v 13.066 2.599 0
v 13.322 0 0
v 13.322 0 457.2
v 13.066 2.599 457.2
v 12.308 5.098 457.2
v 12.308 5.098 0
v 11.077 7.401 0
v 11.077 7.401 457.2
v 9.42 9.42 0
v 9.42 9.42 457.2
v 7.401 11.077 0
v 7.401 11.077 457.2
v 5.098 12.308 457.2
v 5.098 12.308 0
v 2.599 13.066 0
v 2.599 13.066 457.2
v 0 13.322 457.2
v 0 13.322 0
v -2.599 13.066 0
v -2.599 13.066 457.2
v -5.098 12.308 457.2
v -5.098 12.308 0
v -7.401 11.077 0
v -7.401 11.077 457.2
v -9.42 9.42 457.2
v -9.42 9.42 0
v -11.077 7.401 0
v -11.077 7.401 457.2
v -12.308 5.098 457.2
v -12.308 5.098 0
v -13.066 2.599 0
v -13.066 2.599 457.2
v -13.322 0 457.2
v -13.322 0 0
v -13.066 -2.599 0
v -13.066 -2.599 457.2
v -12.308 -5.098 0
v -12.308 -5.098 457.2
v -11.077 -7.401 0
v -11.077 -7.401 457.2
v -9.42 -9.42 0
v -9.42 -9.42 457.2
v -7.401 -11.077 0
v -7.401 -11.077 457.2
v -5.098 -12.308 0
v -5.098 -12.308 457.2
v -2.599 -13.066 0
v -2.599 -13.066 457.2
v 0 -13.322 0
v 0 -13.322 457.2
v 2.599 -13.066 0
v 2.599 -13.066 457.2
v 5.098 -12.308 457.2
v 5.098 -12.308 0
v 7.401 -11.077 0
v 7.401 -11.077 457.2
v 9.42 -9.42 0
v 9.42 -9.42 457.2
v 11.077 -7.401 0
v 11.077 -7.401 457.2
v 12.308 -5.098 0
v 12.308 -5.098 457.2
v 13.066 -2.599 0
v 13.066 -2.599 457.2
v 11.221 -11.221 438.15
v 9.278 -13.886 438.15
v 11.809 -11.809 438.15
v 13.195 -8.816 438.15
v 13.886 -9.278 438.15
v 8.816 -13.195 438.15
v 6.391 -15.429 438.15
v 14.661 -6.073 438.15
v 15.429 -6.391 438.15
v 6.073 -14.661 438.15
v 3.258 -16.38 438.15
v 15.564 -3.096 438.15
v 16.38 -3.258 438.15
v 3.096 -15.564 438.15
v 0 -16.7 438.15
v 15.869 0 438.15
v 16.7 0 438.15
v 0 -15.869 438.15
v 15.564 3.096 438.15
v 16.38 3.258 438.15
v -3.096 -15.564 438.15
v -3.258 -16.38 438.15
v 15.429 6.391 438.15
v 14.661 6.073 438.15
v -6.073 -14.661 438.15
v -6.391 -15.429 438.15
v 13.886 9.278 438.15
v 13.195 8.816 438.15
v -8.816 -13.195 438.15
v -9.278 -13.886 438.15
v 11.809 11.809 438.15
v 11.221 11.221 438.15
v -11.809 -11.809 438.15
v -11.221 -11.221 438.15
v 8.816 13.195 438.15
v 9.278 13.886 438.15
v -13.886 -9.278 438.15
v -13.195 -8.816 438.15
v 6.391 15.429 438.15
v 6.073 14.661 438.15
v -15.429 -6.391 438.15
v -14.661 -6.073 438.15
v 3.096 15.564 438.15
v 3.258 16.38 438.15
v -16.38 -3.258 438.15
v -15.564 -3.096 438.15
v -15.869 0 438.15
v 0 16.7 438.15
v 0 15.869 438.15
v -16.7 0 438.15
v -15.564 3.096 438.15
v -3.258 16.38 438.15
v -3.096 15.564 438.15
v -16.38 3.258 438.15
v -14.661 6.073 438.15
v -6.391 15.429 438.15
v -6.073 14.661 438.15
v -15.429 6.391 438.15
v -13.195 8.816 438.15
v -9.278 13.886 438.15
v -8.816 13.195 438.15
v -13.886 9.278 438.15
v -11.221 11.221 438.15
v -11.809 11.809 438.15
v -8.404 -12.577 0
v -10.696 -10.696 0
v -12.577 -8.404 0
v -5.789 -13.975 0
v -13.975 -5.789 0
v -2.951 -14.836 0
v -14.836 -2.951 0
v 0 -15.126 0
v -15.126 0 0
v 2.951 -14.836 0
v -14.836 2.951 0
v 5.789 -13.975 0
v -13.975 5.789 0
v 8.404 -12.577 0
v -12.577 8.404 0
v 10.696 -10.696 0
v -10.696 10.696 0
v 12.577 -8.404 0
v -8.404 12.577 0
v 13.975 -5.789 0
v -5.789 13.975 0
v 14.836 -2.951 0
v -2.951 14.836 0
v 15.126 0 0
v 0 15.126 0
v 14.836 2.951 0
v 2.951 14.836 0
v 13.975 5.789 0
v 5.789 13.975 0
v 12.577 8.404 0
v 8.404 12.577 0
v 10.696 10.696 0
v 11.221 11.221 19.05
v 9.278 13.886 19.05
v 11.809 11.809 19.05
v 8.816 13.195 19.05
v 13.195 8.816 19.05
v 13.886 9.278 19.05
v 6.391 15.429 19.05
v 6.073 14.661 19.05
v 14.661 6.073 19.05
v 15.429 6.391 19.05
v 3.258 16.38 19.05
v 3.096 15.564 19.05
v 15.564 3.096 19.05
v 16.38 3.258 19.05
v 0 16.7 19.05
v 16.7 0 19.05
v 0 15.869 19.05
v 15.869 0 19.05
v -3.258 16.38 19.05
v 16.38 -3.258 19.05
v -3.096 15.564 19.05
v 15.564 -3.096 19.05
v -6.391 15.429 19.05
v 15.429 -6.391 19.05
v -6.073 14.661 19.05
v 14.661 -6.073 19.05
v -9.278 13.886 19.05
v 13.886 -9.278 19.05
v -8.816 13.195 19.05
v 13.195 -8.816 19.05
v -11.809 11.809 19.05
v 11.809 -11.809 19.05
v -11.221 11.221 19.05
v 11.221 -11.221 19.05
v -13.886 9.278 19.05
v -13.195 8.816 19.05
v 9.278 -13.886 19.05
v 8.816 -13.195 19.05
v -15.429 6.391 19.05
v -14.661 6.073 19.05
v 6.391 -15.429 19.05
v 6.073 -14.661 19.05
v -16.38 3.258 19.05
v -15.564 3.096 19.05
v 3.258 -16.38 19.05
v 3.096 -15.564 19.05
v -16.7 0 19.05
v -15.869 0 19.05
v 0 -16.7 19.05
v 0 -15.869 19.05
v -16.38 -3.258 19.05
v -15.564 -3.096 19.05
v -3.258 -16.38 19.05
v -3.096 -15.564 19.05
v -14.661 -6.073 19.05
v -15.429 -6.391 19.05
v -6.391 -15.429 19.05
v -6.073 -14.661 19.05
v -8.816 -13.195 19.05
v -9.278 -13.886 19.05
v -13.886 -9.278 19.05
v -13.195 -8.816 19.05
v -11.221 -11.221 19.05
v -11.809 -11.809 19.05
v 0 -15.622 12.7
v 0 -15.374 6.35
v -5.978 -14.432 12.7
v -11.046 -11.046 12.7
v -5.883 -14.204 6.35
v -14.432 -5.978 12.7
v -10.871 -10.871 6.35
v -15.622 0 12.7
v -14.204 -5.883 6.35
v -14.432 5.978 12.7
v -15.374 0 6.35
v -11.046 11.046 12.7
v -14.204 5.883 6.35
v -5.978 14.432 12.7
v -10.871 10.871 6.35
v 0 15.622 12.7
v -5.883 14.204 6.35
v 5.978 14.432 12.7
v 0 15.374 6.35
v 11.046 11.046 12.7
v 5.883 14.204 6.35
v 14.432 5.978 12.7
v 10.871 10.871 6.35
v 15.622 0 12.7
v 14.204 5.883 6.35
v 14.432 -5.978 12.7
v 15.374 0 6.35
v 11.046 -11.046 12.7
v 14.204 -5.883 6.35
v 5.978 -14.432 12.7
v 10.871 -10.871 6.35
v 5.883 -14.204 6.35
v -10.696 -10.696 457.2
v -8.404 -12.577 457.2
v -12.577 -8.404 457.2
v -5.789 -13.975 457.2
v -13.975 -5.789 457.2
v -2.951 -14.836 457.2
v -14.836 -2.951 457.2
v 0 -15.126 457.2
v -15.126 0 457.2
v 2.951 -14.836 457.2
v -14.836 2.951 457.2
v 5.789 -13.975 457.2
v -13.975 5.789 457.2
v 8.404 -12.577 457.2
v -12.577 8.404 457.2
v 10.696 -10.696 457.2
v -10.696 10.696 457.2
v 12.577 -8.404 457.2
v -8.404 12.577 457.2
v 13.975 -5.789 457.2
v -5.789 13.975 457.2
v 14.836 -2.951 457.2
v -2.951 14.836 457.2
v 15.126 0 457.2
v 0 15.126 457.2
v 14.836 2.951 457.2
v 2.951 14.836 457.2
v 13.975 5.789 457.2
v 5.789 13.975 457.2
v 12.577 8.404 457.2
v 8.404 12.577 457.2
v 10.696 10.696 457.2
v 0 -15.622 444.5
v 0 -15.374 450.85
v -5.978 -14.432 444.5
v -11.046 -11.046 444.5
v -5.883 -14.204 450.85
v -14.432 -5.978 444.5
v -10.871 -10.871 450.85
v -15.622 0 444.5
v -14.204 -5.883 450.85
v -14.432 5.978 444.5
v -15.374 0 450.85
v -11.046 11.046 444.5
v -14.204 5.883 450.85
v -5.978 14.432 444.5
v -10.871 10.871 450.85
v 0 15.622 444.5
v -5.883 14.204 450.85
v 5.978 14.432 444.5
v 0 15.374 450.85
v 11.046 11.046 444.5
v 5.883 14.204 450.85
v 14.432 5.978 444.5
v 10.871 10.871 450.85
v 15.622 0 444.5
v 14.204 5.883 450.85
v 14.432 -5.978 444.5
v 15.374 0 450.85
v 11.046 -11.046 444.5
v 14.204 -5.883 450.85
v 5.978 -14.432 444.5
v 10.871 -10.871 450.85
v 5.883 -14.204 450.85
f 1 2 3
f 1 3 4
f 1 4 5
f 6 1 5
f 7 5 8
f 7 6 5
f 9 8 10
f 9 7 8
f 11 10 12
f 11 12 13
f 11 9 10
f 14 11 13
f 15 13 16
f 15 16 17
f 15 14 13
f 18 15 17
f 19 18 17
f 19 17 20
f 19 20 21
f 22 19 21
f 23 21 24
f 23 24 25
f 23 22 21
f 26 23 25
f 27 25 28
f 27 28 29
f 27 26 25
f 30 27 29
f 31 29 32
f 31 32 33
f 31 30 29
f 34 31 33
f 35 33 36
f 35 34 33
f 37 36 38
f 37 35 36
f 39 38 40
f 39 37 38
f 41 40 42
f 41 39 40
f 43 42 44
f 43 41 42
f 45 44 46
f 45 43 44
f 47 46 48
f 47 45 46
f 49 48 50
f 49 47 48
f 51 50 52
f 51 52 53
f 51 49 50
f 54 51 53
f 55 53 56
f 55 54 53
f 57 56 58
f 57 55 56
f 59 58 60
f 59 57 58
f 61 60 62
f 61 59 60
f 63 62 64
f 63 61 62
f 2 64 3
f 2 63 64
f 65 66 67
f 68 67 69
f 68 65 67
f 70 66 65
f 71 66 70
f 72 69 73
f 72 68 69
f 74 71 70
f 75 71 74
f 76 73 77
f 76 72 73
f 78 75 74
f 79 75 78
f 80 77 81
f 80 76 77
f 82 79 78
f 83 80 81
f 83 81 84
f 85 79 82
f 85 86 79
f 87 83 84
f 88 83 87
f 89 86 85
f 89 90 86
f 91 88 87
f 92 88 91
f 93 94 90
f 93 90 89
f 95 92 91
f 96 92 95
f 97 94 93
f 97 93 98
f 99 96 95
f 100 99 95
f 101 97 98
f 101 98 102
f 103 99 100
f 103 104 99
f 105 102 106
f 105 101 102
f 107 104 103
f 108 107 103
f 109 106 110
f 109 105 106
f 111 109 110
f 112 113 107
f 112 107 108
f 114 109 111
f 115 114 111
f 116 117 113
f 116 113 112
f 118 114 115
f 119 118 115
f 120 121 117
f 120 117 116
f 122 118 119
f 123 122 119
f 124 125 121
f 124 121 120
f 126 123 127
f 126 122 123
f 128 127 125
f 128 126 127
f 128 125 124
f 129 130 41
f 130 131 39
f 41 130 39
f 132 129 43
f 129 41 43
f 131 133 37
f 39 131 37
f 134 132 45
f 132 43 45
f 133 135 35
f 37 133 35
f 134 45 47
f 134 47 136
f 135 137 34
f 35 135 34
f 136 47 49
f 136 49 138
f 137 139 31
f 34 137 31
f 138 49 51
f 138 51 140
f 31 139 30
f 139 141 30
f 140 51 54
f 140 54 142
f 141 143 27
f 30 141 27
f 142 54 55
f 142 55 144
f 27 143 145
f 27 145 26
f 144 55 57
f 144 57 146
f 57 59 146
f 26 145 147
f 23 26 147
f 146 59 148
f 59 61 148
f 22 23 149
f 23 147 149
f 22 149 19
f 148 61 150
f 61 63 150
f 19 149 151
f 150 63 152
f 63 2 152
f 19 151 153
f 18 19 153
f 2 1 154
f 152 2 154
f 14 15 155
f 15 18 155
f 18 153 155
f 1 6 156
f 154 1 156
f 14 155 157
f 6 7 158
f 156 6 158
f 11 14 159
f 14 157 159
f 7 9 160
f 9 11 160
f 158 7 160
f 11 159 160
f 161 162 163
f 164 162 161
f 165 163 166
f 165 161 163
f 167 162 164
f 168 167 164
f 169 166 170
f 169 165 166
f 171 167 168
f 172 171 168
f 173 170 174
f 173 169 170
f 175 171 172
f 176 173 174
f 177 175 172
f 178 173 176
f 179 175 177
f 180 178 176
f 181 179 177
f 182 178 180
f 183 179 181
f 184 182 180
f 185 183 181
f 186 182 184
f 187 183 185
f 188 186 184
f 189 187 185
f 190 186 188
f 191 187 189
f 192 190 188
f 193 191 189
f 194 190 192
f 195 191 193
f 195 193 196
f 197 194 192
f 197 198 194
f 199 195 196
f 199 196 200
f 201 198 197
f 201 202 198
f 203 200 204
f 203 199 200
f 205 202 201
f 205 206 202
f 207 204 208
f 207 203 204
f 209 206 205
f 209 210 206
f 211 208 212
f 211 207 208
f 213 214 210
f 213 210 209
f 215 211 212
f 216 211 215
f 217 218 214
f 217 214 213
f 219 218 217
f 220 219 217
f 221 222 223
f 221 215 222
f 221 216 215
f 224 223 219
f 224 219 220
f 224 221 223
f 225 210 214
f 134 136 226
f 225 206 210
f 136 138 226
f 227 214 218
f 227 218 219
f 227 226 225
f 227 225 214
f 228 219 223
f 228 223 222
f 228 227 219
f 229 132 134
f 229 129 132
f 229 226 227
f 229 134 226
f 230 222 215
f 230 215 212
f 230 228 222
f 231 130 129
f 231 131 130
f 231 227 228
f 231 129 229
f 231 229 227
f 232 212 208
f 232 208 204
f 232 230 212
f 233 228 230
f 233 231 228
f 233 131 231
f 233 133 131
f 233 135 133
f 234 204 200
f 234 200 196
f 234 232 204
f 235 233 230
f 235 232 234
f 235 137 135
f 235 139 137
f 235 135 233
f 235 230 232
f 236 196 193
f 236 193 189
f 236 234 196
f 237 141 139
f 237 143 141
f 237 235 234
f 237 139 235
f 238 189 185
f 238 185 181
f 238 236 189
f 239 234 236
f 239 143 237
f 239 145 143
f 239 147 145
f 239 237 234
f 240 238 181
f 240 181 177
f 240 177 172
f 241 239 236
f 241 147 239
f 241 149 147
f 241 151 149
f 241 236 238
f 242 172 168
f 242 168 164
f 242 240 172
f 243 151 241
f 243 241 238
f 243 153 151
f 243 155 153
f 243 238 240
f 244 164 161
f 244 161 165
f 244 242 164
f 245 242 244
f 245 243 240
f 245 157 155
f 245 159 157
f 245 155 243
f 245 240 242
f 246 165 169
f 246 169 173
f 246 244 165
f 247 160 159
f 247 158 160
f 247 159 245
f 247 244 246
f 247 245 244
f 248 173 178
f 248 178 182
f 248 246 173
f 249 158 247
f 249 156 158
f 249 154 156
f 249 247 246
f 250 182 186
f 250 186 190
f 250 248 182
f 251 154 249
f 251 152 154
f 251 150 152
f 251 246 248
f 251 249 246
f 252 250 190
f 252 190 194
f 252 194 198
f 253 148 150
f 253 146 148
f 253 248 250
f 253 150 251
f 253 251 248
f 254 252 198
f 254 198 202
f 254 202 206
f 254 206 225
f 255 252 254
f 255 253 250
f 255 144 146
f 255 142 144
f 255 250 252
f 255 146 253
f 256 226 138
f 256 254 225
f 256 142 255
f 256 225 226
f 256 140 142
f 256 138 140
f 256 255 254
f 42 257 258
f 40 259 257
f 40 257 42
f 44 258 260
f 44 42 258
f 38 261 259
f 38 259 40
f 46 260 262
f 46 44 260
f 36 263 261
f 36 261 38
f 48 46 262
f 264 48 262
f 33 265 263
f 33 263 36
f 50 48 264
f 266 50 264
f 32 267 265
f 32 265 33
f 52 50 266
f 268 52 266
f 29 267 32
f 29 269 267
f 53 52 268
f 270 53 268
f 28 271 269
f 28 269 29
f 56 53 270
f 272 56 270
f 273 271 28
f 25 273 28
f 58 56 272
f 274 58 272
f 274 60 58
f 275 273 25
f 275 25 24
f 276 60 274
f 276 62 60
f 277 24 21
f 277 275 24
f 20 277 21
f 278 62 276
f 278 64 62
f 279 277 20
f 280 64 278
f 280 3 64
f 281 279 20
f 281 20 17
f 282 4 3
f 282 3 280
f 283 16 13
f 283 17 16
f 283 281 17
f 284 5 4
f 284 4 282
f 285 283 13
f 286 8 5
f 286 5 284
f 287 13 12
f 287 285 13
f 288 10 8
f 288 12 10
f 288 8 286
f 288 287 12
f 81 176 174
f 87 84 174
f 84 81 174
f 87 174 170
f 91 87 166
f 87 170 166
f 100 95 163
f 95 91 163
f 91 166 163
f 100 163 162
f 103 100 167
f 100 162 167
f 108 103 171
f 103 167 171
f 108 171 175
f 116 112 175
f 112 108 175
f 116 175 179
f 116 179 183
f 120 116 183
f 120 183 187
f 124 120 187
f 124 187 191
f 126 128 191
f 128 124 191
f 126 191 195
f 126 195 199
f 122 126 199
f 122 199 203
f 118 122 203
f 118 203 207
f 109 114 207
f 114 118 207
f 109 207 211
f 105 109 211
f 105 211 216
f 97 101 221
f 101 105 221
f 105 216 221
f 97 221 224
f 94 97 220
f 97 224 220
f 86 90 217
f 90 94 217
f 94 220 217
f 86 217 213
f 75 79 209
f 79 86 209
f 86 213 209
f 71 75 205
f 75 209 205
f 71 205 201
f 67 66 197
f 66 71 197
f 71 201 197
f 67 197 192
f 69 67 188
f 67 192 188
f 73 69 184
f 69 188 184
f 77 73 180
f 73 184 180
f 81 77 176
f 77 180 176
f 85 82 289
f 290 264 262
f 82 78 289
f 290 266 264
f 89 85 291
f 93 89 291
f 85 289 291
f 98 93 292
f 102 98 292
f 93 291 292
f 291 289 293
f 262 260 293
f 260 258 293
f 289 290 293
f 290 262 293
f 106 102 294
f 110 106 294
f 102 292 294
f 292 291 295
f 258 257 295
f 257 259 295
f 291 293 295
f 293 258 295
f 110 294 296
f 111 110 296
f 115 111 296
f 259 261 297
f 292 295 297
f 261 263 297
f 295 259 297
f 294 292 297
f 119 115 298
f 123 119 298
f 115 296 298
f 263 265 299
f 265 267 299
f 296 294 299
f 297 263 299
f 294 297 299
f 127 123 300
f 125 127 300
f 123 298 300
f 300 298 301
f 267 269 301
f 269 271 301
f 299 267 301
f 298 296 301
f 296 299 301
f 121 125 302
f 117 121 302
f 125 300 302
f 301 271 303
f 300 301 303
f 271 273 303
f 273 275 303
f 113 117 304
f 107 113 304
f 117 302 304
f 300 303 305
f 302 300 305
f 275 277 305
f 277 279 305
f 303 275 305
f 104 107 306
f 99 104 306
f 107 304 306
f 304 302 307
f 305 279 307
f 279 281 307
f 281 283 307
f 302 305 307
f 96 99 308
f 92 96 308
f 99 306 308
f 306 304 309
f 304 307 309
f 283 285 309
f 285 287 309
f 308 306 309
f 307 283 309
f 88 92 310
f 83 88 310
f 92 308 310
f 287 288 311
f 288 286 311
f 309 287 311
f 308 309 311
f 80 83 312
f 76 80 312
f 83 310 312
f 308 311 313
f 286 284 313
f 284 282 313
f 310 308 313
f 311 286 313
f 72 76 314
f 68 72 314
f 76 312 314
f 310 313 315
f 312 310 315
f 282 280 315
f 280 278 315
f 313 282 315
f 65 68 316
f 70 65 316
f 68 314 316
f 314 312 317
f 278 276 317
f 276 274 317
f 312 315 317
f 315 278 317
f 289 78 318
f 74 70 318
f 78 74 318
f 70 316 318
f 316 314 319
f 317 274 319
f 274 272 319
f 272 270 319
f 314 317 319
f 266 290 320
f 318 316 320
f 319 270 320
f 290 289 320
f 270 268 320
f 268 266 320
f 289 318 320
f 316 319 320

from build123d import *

# Parameters (mm, degrees)
SKETCH2_R           = 16.7005
SKETCH2_R_2         = 13.3223
BOSS_EXTRUDE1_DEPTH = 457.2


with BuildPart() as part:
    # Sketch2 → Boss-Extrude1 (new body)
    with BuildSketch(Plane.XY):
        Circle(SKETCH2_R)
        Circle(SKETCH2_R_2, mode=Mode.SUBTRACT)
    extrude(amount=BOSS_EXTRUDE1_DEPTH)

    # Sketch3 → Cut-Revolve2 (revolve, cut)
    with BuildSketch(Plane(origin=(0, 0, 0), x_dir=(0, 0, -1), z_dir=(1, 0, 0)), mode=Mode.PRIVATE) as cut_revolve2_sk:
        Polygon((0, 21.813584822), (-19.05, 21.813584822), (-19.05, 16.7005), (-19.05, 15.869250272), (0, 15.126208453), align=None)
        Polygon((-457.2, 15.126208453), (-457.2, 21.813584822), (-438.15, 21.813584822), (-438.15, 16.7005), (-438.15, 15.869250272), align=None)
    revolve(cut_revolve2_sk.sketch.rotate(Axis((0, 0, 228.6), (0, 0, -1)), 180), axis=Axis((0, 0, 228.6), (0, 0, -1)), mode=Mode.SUBTRACT)


solid = part.part
